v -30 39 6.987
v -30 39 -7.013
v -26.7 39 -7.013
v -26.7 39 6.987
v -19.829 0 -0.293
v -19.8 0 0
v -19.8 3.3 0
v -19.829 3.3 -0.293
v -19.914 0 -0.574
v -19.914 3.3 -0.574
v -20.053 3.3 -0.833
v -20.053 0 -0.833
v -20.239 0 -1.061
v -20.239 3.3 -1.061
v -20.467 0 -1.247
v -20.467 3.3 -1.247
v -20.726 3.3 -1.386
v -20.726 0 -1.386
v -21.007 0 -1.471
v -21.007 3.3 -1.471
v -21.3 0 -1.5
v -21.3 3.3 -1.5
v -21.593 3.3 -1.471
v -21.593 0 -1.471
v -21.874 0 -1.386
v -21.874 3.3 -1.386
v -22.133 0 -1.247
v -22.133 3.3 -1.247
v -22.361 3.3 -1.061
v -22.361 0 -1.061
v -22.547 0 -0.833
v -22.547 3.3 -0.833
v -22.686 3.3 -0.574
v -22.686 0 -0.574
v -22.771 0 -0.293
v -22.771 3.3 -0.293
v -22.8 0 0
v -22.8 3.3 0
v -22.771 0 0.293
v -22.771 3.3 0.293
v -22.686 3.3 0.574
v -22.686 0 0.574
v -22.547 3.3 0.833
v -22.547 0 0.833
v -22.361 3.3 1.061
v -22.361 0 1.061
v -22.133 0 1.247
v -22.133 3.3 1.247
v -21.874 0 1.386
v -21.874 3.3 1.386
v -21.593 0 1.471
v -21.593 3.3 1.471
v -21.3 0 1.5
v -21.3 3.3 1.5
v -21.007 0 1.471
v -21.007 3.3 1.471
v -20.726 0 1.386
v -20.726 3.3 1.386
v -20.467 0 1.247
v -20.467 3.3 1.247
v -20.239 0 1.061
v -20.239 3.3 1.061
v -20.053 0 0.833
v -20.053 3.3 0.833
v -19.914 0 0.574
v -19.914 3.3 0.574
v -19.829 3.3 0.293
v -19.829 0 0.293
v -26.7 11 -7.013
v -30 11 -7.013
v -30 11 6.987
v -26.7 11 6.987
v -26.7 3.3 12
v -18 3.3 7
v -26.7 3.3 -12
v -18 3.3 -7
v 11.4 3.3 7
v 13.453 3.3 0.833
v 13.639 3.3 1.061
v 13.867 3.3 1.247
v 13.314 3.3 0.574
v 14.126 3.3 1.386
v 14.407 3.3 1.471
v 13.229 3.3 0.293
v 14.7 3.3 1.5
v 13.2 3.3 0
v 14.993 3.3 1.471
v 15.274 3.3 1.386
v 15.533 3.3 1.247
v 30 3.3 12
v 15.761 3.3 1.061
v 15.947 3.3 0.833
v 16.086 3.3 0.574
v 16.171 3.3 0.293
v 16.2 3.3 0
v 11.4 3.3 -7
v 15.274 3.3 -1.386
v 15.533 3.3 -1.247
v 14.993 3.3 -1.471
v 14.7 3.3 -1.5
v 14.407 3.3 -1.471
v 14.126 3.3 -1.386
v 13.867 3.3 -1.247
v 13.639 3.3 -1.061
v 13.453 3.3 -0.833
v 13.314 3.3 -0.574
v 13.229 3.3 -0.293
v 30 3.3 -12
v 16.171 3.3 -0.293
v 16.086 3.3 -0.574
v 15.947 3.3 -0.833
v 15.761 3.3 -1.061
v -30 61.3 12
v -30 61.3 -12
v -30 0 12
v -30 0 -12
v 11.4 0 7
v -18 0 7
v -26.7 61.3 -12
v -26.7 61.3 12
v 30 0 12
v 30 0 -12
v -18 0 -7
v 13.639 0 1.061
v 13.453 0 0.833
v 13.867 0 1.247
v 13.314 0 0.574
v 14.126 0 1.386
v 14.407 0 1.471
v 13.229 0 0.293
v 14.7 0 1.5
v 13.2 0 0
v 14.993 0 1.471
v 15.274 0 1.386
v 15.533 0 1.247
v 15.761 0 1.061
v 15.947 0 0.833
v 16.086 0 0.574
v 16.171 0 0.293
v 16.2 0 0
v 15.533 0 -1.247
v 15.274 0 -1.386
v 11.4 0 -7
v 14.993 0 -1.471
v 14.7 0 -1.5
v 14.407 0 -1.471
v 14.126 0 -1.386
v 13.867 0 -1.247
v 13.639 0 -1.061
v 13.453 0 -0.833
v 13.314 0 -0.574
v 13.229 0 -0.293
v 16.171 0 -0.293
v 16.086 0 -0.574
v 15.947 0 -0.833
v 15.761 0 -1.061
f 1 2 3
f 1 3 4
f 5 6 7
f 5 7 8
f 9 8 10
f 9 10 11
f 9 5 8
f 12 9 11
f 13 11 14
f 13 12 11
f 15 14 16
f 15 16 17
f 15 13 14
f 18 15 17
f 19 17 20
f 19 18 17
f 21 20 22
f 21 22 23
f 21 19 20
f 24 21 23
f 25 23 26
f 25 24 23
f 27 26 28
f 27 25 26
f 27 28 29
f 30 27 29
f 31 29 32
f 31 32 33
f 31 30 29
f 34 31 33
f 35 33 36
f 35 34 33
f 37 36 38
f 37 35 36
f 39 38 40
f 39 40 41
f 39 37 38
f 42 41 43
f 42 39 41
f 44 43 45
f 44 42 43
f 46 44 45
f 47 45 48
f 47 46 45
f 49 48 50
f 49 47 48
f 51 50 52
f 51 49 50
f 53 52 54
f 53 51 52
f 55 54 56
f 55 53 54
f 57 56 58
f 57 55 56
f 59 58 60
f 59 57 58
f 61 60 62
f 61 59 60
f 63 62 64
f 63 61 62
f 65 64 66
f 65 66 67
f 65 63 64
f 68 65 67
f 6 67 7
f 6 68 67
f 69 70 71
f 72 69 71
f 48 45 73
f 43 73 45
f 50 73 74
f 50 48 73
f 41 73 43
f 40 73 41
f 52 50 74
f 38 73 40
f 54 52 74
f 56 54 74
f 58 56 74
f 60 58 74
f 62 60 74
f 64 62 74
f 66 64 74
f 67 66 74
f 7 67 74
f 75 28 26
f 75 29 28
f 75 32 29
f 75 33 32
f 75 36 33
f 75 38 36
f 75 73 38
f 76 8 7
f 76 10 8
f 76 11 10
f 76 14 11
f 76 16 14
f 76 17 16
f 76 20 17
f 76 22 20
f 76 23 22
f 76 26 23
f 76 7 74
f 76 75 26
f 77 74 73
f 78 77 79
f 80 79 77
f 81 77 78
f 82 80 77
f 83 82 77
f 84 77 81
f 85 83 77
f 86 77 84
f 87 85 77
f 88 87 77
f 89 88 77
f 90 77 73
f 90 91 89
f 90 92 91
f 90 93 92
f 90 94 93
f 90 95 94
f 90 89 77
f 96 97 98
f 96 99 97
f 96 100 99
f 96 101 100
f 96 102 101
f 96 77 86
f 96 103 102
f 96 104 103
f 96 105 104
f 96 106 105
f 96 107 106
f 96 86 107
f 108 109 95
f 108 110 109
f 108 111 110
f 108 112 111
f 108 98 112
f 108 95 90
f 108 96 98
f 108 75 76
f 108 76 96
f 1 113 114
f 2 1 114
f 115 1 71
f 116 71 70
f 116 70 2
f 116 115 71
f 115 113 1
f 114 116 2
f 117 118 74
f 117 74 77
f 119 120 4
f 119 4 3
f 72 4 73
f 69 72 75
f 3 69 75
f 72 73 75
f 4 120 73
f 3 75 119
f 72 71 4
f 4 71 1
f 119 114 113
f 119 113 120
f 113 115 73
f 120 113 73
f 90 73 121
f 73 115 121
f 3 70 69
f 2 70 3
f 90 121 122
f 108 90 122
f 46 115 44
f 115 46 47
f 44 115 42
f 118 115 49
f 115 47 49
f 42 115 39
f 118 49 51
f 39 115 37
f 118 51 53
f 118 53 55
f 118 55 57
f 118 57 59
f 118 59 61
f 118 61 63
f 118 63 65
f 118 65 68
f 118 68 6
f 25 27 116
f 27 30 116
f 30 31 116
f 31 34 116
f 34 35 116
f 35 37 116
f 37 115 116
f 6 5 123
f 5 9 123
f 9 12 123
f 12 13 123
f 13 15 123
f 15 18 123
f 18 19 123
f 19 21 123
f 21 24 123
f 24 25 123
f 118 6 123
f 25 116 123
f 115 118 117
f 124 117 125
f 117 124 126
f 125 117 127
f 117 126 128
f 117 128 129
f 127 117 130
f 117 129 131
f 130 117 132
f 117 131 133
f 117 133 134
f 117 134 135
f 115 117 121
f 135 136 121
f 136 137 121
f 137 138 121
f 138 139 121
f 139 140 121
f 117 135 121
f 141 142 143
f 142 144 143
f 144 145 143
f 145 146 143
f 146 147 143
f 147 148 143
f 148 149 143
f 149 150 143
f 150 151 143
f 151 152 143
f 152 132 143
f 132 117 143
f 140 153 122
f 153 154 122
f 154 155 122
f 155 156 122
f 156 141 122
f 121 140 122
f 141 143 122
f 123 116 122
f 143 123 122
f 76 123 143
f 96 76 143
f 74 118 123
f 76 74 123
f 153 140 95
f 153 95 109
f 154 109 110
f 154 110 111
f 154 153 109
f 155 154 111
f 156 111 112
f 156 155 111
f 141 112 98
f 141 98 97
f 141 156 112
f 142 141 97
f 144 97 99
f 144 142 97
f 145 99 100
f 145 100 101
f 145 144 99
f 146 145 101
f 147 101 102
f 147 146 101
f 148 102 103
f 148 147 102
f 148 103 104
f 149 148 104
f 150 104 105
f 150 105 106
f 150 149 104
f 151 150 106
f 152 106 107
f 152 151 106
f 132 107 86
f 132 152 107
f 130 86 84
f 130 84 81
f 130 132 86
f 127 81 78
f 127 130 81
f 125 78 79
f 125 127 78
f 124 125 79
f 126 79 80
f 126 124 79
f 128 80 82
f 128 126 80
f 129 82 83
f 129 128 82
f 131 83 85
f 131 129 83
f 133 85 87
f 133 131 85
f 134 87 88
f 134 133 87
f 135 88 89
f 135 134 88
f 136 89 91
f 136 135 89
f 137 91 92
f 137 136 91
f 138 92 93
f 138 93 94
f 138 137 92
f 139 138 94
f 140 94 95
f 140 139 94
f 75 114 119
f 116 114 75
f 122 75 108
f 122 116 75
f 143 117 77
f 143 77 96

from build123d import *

# Parameters (mm, degrees)
SKETCH1_W           = 60
SKETCH1_H           = 24
BOSS_EXTRUDE1_DEPTH = 3.3
SKETCH2_W           = 3.3
SKETCH2_H           = 24
BOSS_EXTRUDE2_DEPTH = 61.3
SKETCH7_R           = 1.5
SKETCH7_W           = 29.4
SKETCH7_H           = 14
CUT_EXTRUDE4_DEPTH  = 3.3
SKETCH9_W           = 14
SKETCH9_H           = 28
CUT_EXTRUDE5_DEPTH  = 10


with BuildPart() as part:
    # Sketch1 → Boss-Extrude1 (new body)
    with BuildSketch(Plane(origin=(0, 0, 0), x_dir=(1, 0, 0), z_dir=(0, 1, 0))):
        Rectangle(SKETCH1_W, SKETCH1_H)
    extrude(amount=BOSS_EXTRUDE1_DEPTH)

    # Sketch2 → Boss-Extrude2 (add)
    with BuildSketch(Plane(origin=(0, 0, 0), x_dir=(1, 0, 0), z_dir=(0, 1, 0))):
        with Locations((-28.35, 0)):
            Rectangle(SKETCH2_W, SKETCH2_H)
    extrude(amount=BOSS_EXTRUDE2_DEPTH)

    # Sketch7 → Cut-Extrude4 (cut)
    with BuildSketch(Plane(origin=(0, 0, 0), x_dir=(1, 0, 0), z_dir=(0, 1, 0))):
        with Locations((-21.3, 0)):
            Circle(SKETCH7_R)
        with Locations((14.7, 0)):
            Circle(SKETCH7_R)
        with Locations((-3.3, 0)):
            Rectangle(SKETCH7_W, SKETCH7_H)
    extrude(amount=CUT_EXTRUDE4_DEPTH, mode=Mode.SUBTRACT)

    # Sketch9 → Cut-Extrude5 (cut)
    with BuildSketch(Plane.ZY.offset(30)):
        with Locations((-0.012794058, 25)):
            Rectangle(SKETCH9_W, SKETCH9_H)
    extrude(amount=-CUT_EXTRUDE5_DEPTH, mode=Mode.SUBTRACT)


solid = part.part
